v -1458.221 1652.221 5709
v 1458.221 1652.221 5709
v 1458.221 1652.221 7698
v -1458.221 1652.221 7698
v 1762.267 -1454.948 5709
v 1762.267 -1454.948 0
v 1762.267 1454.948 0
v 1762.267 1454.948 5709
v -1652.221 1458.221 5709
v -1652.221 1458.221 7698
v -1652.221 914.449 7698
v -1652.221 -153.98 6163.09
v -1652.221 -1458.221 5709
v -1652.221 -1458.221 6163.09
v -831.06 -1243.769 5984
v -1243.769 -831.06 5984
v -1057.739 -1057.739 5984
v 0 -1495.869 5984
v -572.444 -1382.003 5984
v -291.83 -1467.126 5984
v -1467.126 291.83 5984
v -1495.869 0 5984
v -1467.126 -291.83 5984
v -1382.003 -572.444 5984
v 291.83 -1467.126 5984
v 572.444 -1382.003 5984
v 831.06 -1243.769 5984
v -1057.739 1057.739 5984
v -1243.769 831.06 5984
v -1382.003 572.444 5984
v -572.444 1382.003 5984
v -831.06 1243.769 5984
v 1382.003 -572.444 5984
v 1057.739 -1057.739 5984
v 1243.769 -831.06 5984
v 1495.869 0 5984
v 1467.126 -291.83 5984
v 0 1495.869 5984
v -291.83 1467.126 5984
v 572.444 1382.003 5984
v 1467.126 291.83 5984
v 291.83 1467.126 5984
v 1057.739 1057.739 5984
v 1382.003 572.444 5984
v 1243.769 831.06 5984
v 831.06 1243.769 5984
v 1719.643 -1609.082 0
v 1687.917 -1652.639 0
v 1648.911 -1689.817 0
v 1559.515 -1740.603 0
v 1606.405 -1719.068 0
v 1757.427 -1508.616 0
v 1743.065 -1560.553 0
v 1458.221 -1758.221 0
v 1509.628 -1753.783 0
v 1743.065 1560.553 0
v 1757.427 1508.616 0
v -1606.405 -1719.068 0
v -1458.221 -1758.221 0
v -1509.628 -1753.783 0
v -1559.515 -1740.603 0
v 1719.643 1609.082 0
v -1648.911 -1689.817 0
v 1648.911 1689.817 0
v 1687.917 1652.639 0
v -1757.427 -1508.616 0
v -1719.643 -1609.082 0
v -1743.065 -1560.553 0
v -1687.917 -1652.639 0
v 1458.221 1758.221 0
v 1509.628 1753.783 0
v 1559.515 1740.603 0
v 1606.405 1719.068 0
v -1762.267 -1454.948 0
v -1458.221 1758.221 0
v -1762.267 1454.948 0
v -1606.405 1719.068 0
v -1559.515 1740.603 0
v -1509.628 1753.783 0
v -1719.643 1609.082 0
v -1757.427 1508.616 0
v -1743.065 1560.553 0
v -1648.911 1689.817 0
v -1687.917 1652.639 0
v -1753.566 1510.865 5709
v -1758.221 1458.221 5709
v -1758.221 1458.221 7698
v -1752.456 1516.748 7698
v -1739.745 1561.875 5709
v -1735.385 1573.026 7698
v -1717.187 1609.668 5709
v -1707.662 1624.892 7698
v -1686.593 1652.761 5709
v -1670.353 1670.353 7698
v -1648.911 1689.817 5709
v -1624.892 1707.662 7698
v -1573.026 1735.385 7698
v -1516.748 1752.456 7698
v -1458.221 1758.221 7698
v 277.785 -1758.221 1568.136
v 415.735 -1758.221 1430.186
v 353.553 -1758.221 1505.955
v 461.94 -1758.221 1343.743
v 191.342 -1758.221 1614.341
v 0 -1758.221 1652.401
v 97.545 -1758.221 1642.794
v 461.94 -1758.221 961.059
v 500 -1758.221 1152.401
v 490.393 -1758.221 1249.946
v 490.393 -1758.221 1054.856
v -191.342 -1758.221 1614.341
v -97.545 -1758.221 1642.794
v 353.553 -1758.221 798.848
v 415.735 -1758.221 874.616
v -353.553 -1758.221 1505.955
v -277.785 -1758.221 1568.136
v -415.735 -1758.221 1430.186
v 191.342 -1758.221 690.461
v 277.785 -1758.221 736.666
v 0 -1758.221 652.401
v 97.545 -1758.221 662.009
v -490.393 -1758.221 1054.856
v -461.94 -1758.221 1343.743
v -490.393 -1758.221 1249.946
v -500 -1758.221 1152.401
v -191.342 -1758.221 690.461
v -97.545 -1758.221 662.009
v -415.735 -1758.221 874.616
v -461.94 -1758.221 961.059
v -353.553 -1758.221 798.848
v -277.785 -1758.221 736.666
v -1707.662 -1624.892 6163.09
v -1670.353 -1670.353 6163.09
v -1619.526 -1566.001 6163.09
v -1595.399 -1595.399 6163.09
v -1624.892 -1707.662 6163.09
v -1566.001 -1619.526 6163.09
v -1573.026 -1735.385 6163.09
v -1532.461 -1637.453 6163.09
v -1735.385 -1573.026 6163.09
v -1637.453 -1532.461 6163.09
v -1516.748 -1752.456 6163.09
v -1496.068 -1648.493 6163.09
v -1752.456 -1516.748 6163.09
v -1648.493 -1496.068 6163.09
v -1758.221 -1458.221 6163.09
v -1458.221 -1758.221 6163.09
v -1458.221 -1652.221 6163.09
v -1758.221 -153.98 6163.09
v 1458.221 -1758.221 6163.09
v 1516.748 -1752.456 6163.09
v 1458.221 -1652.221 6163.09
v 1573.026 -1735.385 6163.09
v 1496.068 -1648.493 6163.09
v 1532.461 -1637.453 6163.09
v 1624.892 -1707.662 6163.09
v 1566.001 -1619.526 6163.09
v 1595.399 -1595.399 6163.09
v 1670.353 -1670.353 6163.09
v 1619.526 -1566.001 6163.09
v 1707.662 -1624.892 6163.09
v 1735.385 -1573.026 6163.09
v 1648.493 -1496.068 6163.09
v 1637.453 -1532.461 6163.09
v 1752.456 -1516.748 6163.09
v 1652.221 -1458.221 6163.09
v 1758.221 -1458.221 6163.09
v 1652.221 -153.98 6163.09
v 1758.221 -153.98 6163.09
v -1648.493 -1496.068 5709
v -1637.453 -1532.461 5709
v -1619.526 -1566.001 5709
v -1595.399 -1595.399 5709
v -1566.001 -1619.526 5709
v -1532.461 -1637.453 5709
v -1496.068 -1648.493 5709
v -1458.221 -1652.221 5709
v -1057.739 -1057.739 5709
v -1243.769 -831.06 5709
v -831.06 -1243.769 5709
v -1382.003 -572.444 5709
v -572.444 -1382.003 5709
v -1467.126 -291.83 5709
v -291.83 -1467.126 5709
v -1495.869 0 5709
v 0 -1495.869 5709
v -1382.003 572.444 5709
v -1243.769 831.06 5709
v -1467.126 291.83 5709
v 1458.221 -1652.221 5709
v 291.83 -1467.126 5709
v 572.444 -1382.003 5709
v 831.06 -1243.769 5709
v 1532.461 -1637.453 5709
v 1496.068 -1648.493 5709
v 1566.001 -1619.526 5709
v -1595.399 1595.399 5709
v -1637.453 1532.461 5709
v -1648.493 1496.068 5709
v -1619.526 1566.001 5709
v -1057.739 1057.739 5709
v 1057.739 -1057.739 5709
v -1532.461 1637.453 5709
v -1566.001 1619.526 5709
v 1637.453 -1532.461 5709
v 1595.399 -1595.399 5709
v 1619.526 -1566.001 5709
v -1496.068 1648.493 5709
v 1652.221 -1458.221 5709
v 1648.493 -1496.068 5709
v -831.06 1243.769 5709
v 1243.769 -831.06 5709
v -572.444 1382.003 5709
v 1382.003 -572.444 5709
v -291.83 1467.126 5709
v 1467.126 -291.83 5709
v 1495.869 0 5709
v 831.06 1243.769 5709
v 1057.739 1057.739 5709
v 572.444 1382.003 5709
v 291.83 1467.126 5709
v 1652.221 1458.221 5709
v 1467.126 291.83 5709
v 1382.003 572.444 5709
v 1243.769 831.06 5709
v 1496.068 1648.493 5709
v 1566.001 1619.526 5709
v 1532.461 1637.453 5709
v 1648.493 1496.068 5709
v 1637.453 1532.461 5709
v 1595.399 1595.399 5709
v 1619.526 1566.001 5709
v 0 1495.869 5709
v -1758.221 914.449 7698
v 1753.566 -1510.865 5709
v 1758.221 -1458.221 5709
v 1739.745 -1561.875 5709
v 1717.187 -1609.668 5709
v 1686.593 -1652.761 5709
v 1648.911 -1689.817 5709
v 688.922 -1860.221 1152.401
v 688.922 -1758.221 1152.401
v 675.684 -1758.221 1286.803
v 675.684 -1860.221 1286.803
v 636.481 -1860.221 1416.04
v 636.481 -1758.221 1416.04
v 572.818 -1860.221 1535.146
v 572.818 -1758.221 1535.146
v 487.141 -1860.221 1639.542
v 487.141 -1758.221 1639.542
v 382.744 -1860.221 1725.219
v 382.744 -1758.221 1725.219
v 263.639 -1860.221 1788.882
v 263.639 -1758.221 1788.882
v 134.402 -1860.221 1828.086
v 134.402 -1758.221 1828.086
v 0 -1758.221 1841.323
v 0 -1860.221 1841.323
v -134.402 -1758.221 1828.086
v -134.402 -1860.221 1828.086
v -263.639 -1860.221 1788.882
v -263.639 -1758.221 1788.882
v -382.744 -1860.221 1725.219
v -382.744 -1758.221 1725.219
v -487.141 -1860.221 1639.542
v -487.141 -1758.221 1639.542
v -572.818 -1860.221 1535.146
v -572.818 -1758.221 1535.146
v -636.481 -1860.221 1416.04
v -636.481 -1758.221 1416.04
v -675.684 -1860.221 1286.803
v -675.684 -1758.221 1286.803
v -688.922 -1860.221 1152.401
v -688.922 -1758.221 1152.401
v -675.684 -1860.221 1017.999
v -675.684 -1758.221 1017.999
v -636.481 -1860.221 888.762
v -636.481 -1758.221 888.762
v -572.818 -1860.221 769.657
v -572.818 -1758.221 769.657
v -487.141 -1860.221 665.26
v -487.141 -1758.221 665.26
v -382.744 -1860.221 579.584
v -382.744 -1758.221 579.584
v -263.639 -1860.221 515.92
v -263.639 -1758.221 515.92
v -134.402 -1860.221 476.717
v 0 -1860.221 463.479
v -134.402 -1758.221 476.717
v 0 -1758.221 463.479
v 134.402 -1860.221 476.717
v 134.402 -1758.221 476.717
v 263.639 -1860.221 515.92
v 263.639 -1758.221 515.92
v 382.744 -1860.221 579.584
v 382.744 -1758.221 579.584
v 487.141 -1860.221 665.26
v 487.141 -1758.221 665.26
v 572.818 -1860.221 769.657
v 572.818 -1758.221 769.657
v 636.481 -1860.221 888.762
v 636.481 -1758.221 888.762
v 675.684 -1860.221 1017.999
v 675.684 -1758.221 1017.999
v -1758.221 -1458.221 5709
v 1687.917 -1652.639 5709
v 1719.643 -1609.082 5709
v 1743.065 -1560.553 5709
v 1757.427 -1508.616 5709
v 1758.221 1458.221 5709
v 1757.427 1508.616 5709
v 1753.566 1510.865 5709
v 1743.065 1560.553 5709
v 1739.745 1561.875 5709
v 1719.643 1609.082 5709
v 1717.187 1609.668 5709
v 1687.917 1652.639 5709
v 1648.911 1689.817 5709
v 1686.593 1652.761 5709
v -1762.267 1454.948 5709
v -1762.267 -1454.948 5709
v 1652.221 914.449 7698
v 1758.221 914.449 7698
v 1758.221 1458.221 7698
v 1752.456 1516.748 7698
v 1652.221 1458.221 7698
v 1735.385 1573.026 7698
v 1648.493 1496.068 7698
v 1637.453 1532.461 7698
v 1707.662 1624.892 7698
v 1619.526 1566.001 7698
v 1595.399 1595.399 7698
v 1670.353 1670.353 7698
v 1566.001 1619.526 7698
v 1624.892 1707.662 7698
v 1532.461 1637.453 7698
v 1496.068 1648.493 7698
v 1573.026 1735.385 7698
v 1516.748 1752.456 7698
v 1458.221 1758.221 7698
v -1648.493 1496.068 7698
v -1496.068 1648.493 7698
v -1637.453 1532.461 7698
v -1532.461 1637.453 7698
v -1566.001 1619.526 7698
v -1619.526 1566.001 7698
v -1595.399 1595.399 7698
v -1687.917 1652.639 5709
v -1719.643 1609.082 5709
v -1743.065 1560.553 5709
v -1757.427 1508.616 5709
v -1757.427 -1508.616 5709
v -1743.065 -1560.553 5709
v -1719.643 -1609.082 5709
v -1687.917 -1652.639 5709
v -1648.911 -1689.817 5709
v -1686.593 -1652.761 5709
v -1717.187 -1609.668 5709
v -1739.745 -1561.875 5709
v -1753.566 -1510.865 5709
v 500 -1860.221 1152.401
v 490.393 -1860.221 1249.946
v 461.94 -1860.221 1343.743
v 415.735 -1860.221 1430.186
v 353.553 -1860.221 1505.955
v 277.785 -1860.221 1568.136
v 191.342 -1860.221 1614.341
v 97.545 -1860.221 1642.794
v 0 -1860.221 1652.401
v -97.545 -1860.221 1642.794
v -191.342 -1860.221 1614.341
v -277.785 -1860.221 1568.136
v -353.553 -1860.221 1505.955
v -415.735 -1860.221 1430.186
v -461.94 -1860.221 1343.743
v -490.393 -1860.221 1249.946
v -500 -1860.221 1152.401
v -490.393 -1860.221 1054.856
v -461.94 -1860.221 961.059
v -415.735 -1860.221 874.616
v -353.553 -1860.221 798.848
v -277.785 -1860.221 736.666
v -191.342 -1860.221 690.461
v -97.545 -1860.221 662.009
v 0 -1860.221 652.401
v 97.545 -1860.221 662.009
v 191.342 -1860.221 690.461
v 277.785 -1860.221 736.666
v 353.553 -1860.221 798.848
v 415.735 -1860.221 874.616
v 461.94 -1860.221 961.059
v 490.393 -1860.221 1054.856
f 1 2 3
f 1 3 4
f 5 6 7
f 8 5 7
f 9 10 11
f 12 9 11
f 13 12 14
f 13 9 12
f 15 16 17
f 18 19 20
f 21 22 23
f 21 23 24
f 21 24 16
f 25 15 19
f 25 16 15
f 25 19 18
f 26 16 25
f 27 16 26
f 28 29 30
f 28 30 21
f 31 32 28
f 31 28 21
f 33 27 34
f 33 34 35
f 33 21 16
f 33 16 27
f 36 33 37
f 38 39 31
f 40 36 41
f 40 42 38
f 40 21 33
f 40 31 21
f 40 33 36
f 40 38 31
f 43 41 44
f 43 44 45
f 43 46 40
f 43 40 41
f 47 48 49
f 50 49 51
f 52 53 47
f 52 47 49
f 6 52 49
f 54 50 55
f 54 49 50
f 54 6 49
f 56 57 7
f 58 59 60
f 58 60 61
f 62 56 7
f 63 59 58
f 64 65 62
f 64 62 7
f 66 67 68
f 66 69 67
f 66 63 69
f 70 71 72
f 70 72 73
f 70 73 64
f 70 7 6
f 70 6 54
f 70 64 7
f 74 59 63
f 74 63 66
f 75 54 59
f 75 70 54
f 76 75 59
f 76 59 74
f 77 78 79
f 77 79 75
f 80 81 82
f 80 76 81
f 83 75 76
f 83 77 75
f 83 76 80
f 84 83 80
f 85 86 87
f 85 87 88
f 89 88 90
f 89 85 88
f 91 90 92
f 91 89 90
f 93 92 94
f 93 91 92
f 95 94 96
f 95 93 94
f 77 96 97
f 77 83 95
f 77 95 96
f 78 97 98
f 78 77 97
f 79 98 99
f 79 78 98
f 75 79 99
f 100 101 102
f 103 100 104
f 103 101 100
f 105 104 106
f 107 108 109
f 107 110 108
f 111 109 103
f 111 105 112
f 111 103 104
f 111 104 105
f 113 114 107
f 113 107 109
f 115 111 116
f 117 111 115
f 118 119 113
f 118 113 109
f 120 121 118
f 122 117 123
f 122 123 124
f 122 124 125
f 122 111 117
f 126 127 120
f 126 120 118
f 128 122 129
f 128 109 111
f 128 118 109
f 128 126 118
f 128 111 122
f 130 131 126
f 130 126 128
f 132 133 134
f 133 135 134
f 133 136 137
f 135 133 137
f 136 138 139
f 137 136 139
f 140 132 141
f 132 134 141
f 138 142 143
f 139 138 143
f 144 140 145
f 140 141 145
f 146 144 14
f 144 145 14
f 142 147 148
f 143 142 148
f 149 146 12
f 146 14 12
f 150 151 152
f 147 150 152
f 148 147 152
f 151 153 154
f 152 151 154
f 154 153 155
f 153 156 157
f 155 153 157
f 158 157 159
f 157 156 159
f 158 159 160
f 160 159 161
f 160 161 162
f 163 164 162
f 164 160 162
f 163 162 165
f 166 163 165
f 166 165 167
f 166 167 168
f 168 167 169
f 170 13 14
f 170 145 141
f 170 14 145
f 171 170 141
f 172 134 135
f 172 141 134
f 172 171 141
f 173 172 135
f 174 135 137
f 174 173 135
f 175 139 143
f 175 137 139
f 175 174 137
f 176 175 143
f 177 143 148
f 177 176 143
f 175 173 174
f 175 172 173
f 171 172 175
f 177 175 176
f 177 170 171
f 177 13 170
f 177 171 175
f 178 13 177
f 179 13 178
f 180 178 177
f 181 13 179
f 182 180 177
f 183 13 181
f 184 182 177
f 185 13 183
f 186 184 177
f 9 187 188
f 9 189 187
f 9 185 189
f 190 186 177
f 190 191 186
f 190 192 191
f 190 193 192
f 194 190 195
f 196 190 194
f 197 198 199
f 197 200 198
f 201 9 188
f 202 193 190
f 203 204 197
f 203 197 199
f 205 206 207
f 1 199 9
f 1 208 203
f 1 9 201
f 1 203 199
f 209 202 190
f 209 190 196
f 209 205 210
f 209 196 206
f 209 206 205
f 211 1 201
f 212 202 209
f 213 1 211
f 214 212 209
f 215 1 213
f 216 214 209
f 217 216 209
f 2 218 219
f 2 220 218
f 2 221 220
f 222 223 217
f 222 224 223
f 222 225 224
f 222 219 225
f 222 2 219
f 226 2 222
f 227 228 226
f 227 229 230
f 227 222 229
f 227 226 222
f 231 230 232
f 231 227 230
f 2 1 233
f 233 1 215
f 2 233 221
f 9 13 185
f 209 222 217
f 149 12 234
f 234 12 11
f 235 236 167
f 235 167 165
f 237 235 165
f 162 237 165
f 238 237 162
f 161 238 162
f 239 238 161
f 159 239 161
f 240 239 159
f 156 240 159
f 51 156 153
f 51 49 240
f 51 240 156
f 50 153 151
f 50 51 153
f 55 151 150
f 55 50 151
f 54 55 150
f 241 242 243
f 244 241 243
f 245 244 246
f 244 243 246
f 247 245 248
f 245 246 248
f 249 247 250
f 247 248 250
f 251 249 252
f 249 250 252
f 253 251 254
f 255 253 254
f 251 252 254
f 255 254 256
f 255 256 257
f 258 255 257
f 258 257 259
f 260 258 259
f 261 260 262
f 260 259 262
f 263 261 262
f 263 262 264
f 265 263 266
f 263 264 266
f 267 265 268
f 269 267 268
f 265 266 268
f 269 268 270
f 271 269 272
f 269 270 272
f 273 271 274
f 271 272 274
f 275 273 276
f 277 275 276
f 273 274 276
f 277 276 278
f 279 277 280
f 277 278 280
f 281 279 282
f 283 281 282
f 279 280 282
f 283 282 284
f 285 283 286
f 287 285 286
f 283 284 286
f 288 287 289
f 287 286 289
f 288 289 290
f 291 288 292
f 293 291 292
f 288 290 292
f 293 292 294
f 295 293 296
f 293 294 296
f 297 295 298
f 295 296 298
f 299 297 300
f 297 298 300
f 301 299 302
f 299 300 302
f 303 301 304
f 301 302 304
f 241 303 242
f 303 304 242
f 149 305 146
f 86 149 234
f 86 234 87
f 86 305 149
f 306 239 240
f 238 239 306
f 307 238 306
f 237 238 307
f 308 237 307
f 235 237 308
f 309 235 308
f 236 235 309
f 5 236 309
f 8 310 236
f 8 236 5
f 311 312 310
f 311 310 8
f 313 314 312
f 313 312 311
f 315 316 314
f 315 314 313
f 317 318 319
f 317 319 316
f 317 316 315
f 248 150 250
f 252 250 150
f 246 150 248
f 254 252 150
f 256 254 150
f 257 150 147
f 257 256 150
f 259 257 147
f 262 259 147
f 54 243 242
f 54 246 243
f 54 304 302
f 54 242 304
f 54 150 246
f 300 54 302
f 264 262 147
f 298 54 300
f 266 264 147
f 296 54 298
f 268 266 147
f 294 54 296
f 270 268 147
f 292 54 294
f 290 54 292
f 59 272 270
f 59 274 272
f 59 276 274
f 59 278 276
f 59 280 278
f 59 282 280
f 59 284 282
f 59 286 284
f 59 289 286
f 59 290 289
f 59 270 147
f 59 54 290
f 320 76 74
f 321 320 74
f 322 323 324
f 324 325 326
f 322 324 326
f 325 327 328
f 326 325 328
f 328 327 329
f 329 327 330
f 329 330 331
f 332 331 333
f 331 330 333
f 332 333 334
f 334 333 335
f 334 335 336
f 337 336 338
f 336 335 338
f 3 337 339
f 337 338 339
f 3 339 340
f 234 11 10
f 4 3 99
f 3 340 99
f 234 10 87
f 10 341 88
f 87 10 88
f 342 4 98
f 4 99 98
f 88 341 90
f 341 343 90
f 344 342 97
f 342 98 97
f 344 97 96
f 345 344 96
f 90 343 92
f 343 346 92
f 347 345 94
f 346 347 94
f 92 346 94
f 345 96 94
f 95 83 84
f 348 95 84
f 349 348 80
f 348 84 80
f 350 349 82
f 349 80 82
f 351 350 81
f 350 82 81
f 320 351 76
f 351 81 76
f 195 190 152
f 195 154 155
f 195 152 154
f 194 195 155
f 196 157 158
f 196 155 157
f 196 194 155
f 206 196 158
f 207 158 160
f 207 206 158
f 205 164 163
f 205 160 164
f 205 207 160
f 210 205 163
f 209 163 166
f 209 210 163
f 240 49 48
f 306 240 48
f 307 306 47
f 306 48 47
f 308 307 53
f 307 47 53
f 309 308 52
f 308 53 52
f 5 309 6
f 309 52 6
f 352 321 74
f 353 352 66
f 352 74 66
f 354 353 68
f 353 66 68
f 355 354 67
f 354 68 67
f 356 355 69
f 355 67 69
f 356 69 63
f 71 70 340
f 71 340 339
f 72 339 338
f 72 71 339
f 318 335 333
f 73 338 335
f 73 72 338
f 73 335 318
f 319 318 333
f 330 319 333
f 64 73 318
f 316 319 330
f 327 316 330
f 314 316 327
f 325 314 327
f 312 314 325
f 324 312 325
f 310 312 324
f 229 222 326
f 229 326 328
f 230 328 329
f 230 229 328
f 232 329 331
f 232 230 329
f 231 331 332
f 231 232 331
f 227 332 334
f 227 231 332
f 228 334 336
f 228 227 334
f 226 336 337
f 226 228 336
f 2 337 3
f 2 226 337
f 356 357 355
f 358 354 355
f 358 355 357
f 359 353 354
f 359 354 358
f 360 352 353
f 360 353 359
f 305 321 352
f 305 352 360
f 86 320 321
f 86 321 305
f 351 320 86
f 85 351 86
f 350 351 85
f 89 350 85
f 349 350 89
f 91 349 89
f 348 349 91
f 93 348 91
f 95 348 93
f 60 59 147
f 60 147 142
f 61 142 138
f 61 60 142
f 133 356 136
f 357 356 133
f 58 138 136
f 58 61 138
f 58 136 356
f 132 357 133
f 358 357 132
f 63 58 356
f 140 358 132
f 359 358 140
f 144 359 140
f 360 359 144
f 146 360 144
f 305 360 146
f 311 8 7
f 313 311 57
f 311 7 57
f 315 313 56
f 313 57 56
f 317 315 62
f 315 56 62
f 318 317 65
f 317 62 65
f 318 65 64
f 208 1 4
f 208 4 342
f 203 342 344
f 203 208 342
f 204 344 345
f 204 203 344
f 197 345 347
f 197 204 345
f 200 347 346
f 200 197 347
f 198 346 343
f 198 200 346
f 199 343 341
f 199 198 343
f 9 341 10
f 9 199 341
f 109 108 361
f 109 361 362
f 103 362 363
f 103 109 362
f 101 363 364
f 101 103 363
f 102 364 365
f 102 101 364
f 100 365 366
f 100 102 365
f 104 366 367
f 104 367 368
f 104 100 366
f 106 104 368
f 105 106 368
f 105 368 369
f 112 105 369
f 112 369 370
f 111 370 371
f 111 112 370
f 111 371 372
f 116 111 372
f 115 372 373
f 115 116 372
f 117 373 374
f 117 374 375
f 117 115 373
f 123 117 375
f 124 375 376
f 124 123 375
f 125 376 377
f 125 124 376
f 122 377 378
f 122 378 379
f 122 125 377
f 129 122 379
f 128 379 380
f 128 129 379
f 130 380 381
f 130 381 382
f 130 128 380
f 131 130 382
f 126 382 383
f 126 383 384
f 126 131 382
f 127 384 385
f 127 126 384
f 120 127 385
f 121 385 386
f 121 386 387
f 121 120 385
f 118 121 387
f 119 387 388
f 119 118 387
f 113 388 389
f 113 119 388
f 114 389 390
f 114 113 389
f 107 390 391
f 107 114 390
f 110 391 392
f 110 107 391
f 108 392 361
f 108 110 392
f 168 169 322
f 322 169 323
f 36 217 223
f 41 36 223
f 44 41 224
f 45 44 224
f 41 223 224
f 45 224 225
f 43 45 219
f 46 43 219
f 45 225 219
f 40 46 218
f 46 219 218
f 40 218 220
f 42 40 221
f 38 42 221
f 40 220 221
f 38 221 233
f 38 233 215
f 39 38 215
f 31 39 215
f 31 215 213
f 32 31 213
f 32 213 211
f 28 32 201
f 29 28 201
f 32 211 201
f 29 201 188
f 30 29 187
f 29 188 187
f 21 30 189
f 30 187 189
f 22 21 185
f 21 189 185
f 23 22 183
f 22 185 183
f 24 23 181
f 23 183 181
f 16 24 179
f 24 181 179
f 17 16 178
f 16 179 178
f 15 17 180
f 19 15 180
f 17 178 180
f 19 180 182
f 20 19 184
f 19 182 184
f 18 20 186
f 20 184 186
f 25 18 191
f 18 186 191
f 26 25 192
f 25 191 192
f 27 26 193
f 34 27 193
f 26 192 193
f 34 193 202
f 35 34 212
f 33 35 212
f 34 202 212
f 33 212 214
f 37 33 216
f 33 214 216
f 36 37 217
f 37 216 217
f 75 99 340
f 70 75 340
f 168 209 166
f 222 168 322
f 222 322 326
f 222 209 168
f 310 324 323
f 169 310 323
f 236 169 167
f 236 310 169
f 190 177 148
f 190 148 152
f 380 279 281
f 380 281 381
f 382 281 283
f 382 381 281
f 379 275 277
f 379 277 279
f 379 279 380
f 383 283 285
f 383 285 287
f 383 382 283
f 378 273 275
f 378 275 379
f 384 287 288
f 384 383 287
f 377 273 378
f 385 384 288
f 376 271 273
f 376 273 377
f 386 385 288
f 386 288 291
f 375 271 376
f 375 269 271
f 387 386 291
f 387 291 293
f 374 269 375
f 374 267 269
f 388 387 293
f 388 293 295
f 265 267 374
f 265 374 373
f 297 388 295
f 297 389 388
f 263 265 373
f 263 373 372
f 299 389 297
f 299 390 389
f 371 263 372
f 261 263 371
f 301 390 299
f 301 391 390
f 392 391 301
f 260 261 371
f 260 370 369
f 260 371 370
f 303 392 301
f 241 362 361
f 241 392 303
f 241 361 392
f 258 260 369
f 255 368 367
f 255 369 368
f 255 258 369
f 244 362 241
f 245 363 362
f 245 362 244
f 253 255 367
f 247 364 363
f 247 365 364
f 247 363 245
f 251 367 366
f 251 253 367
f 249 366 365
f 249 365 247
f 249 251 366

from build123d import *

# Parameters (mm, degrees)
BOSS_EXTRUDE1_DEPTH = 7698
BOSS_EXTRUDE2_DEPTH = 5709
CUT_EXTRUDE1_DEPTH  = 5709
SKETCH5_R           = 688.921896872
SKETCH5_R_2         = 500
BOSS_EXTRUDE3_DEPTH = 102
SKETCH7_R           = 1495.868851997
BOSS_EXTRUDE4_DEPTH = 275


with BuildPart() as part:
    # Sketch2 → Boss-Extrude1 (new body)
    with BuildSketch(Plane.XY):
        with BuildLine():
            Line((1458.220709409, -1758.220709409), (-1458.220709409, -1758.220709409))
            ThreePointArc((-1458.220709409, -1758.220709409), (-1670.352743765, -1670.352743765), (-1758.220709409, -1458.220709409))
            Line((-1758.220709409, -1458.220709409), (-1758.220709409, 1458.220709409))
            ThreePointArc((-1758.220709409, 1458.220709409), (-1670.352743765, 1670.352743765), (-1458.220709409, 1758.220709409))
            Line((-1458.220709409, 1758.220709409), (1458.220709409, 1758.220709409))
            ThreePointArc((1458.220709409, 1758.220709409), (1670.352743765, 1670.352743765), (1758.220709409, 1458.220709409))
            Line((1758.220709409, 1458.220709409), (1758.220709409, -1458.220709409))
            ThreePointArc((1758.220709409, -1458.220709409), (1670.352743765, -1670.352743765), (1458.220709409, -1758.220709409))
        make_face()
        with BuildLine():
            Line((1458.220709409, 1652.220709409), (-1458.220709409, 1652.220709409))
            ThreePointArc((-1458.220709409, 1652.220709409), (-1595.399424959, 1595.399424959), (-1652.220709409, 1458.220709409))
            Line((-1652.220709409, 1458.220709409), (-1652.220709409, -1458.220709409))
            ThreePointArc((-1652.220709409, -1458.220709409), (-1595.399424959, -1595.399424959), (-1458.220709409, -1652.220709409))
            Line((-1458.220709409, -1652.220709409), (1458.220709409, -1652.220709409))
            ThreePointArc((1458.220709409, -1652.220709409), (1595.399424959, -1595.399424959), (1652.220709409, -1458.220709409))
            Line((1652.220709409, -1458.220709409), (1652.220709409, 1458.220709409))
            ThreePointArc((1652.220709409, 1458.220709409), (1595.399424959, 1595.399424959), (1458.220709409, 1652.220709409))
        make_face(mode=Mode.SUBTRACT)
    extrude(amount=BOSS_EXTRUDE1_DEPTH)

    # Sketch3 → Boss-Extrude2 (add)
    with BuildSketch(Plane(origin=(0, 0, 0), x_dir=(-1, 0, 0), z_dir=(0, 0, -1))):
        with BuildLine():
            Line((1462.266623483, -1754.947873154), (-1462.266623483, -1754.947873154))
            ThreePointArc((-1462.266623483, -1754.947873154), (-1674.398657839, -1667.07990751), (-1762.266623483, -1454.947873154))
            Line((-1762.266623483, -1454.947873154), (-1762.266623483, 1454.947873154))
            ThreePointArc((-1762.266623483, 1454.947873154), (-1674.398657839, 1667.07990751), (-1462.266623483, 1754.947873154))
            Line((-1462.266623483, 1754.947873154), (1462.266623483, 1754.947873154))
            ThreePointArc((1462.266623483, 1754.947873154), (1674.398657839, 1667.07990751), (1762.266623483, 1454.947873154))
            Line((1762.266623483, 1454.947873154), (1762.266623483, -1454.947873154))
            ThreePointArc((1762.266623483, -1454.947873154), (1674.398657839, -1667.07990751), (1462.266623483, -1754.947873154))
        make_face()
    extrude(amount=-BOSS_EXTRUDE2_DEPTH)

    # Sketch4 → Cut-Extrude1 (cut)
    with BuildSketch(Plane(origin=(1758.220709409, 0, 0), x_dir=(0, 0, -1), z_dir=(1, 0, 0))):
        Polygon((-7698, 914.449134534), (-7698, -1758.220709409), (-6163.089789465, -1758.220709409), (-6163.089789465, -153.979819584), align=None)
    extrude(amount=-CUT_EXTRUDE1_DEPTH, mode=Mode.SUBTRACT)

    # Sketch5 → Boss-Extrude3 (add)
    with BuildSketch(Plane.XZ.offset(1758.220709409)):
        with Locations((0, 1152.401140837)):
            Circle(SKETCH5_R)
        with Locations((0, 1152.401140837)):
            Circle(SKETCH5_R_2, mode=Mode.SUBTRACT)
    extrude(amount=BOSS_EXTRUDE3_DEPTH)

    # Sketch7 → Boss-Extrude4 (add)
    with BuildSketch(Plane.XY.offset(5709)):
        Circle(SKETCH7_R)
    extrude(amount=BOSS_EXTRUDE4_DEPTH)


solid = part.part
